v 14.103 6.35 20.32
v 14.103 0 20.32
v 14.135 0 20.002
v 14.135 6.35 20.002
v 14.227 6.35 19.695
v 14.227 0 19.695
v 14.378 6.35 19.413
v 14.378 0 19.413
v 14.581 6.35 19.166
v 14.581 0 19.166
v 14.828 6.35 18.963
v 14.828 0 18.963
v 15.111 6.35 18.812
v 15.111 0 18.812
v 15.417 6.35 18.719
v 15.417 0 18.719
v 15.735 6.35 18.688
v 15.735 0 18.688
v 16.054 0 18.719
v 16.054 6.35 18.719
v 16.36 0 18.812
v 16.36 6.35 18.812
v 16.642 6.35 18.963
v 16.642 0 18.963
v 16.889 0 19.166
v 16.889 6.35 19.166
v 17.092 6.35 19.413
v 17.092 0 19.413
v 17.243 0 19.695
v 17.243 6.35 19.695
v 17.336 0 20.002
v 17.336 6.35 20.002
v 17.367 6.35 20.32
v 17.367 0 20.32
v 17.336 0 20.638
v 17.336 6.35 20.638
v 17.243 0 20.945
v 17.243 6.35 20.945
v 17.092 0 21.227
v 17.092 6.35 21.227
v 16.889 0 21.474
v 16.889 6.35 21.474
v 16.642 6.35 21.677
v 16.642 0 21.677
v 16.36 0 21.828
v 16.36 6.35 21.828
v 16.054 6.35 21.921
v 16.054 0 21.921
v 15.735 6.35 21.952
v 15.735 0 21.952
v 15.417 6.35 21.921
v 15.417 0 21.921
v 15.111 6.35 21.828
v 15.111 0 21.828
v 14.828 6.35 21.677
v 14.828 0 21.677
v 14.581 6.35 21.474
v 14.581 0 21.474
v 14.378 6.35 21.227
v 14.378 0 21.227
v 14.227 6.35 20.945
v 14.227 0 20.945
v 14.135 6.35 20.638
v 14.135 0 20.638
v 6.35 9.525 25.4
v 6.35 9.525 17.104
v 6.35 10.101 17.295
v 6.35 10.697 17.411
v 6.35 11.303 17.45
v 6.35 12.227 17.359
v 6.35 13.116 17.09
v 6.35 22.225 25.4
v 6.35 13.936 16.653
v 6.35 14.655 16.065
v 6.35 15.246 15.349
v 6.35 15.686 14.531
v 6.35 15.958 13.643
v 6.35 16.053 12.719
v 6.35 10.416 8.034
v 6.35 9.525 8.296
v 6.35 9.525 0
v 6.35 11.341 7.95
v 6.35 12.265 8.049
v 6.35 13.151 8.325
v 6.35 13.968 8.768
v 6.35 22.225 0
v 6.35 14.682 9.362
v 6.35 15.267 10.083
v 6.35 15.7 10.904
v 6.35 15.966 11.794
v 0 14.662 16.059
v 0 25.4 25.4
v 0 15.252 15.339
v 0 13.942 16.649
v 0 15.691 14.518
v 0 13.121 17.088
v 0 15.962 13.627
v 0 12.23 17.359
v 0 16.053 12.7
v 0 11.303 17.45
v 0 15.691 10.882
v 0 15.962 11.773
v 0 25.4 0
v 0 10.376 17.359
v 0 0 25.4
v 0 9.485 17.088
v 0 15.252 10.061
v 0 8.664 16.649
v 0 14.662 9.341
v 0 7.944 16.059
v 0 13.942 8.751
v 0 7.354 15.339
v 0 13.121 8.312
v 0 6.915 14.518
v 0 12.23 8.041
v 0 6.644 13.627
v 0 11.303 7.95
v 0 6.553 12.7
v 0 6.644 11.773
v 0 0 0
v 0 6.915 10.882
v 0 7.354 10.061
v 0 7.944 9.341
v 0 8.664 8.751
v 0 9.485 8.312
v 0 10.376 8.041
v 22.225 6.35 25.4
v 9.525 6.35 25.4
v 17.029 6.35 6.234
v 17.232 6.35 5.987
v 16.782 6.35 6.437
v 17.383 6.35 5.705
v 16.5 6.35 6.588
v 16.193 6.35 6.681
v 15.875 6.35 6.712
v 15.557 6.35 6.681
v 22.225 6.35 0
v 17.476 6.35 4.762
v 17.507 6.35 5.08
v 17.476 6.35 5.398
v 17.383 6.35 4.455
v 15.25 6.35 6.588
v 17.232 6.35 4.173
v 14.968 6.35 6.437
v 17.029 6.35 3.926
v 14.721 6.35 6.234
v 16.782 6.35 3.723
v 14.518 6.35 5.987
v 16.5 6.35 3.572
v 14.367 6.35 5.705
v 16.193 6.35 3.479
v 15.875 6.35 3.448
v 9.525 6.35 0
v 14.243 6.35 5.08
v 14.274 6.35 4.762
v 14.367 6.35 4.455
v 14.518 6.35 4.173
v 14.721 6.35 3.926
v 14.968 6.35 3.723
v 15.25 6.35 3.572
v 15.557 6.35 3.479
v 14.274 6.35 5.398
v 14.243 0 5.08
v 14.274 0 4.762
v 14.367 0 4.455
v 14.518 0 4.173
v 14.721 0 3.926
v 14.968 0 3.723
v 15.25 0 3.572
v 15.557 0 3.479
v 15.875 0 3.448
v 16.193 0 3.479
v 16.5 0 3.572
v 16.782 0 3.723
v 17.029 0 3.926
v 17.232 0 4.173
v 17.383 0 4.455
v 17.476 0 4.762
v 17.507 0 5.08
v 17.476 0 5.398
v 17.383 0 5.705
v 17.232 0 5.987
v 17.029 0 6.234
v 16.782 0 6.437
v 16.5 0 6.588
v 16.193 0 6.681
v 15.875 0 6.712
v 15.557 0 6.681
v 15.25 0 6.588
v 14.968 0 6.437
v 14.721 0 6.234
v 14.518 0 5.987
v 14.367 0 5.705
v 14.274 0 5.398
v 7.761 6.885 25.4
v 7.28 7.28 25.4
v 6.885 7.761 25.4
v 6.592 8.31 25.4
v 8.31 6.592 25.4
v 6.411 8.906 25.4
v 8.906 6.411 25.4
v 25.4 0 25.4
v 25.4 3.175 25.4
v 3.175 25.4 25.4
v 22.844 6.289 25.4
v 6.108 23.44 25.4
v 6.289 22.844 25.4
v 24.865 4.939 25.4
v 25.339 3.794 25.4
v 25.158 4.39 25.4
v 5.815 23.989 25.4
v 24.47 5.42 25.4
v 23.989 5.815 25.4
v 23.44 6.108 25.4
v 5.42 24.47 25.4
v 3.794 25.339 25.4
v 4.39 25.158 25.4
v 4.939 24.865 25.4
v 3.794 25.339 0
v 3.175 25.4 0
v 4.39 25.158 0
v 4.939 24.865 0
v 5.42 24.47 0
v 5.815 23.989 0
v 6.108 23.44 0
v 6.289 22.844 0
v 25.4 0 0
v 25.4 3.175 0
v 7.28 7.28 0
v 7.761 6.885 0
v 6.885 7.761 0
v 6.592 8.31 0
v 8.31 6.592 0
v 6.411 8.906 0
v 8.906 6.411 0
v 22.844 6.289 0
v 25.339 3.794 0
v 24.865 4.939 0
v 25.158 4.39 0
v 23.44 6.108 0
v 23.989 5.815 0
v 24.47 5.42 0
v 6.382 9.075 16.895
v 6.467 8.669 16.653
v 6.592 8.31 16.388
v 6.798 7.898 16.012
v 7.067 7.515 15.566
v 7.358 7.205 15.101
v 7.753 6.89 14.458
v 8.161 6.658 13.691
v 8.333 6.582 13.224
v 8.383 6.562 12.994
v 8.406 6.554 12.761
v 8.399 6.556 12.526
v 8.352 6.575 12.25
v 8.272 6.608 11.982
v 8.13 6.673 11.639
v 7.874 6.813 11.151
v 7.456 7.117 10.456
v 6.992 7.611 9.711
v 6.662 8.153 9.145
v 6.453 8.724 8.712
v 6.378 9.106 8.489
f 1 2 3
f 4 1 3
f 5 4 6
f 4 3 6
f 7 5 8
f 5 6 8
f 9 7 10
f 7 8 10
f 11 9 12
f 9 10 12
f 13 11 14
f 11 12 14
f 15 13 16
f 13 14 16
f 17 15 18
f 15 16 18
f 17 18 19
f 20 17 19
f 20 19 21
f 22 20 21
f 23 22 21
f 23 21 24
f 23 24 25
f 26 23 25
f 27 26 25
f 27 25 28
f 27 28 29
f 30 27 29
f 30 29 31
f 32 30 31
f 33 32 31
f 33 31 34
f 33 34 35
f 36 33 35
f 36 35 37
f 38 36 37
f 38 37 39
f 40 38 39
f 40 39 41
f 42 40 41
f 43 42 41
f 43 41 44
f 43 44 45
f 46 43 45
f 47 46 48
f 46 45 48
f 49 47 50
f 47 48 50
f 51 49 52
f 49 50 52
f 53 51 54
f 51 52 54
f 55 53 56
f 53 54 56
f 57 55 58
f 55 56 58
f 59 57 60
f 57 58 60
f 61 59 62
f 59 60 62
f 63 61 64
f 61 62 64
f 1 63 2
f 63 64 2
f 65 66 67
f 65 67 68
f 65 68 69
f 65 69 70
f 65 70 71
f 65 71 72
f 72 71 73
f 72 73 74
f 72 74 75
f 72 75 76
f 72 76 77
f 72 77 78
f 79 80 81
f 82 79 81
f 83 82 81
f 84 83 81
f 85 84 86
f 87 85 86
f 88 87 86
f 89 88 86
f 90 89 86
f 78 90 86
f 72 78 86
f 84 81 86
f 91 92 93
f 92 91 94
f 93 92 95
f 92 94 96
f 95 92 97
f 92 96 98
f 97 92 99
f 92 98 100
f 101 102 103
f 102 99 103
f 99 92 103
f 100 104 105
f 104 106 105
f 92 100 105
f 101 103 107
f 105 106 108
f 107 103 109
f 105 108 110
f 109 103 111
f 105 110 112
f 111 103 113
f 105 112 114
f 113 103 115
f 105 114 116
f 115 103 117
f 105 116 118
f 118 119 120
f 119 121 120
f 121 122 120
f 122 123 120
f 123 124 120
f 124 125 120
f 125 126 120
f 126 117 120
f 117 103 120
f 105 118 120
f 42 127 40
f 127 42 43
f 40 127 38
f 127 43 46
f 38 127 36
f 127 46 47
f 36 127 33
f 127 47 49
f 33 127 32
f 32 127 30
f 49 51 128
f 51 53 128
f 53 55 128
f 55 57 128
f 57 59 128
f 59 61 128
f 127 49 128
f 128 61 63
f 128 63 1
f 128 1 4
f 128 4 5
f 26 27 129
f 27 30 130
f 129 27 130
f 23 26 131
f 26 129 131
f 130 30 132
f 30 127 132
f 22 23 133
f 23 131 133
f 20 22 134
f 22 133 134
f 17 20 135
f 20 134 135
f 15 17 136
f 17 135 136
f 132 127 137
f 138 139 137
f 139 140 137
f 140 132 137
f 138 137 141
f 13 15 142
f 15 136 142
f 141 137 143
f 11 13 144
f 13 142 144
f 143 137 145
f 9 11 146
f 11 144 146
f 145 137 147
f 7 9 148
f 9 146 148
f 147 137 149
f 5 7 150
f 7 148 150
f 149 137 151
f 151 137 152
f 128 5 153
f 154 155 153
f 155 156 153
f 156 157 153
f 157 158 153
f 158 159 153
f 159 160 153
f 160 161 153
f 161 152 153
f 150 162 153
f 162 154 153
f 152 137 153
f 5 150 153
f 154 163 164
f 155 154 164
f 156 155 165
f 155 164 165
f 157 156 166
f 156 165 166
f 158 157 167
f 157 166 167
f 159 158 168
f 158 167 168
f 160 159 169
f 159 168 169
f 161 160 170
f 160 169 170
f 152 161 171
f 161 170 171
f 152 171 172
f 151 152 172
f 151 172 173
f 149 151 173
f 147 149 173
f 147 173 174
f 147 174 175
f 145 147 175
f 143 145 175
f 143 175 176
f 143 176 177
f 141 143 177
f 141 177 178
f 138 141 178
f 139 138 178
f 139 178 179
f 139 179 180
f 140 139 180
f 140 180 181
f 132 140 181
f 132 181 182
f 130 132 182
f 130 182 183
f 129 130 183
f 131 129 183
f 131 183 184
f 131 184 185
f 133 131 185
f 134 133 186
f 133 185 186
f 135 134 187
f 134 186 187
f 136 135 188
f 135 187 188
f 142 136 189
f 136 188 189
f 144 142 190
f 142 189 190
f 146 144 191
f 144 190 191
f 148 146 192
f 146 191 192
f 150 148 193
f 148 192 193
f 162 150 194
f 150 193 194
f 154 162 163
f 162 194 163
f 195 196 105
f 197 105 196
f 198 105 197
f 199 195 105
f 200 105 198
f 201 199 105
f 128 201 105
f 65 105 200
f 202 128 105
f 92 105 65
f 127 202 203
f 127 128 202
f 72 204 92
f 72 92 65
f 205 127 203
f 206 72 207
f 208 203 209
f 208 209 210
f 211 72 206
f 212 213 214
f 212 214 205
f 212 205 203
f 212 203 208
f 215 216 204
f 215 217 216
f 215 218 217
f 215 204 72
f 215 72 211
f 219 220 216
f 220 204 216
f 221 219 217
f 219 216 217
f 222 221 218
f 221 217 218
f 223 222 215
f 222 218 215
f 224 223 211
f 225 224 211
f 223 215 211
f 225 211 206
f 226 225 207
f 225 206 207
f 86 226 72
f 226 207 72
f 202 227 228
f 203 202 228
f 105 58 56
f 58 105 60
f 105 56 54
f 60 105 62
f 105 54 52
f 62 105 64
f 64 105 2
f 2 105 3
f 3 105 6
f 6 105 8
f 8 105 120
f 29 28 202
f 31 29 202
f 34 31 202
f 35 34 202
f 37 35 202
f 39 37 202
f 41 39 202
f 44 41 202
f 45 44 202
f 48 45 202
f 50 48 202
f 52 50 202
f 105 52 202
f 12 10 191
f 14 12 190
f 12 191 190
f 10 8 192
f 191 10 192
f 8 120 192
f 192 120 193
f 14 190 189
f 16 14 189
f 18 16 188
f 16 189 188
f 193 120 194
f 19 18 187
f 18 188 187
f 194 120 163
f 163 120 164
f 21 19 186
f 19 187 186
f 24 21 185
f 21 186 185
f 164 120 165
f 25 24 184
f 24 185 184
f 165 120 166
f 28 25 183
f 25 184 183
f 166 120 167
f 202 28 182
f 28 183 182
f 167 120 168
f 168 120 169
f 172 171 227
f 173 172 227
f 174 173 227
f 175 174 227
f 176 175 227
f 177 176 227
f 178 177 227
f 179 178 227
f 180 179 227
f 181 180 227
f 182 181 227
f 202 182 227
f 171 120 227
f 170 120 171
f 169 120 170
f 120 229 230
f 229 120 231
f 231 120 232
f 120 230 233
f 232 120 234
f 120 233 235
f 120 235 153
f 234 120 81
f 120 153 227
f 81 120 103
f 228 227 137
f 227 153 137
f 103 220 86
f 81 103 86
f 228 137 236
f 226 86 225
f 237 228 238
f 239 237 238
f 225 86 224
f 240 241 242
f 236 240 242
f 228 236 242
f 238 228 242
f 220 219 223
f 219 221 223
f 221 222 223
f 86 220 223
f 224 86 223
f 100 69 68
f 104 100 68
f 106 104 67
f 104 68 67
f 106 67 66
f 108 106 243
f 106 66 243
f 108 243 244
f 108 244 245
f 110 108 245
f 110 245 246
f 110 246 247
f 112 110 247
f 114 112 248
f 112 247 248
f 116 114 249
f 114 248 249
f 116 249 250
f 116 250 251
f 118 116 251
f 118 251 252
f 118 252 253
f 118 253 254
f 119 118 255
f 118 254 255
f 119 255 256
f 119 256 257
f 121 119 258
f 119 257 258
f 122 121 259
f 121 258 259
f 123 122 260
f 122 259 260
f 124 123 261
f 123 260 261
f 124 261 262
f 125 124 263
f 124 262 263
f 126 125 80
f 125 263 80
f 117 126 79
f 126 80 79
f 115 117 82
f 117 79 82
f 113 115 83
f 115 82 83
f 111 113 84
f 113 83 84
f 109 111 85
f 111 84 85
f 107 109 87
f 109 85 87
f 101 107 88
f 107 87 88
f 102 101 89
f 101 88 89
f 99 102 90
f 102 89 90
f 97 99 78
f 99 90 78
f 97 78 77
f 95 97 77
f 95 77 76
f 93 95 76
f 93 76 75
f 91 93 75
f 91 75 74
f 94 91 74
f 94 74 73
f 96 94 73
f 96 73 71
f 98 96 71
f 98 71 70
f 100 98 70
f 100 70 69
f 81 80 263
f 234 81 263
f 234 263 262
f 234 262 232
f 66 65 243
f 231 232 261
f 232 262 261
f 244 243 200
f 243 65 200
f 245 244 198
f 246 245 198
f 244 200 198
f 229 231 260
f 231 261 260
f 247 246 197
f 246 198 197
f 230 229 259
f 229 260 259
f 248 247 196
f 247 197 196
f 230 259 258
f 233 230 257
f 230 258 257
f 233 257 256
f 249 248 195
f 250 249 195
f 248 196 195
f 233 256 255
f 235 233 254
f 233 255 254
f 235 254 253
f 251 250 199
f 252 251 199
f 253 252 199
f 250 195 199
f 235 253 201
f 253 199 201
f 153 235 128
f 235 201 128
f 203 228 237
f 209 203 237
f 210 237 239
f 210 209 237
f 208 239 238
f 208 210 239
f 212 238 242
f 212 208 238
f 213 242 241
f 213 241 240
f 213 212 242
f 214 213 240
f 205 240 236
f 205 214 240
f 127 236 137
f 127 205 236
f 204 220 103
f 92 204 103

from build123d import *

# Parameters (mm, degrees)
BOSS_EXTRUDE1_DEPTH          = 25.4
F_4_CLEARANCE_HOLE1_D        = 3.2639
FILLET1_R                    = 3.175
F_3_8_0_374_DIAMETER_HOLE1_D = 9.4996


with BuildPart() as part:
    # Sketch1 → Boss-Extrude1 (new body)
    with BuildSketch(Plane.XY):
        Polygon((0, 25.4), (0, 0), (25.4, 0), (25.4, 6.35), (6.35, 6.35), (6.35, 25.4), align=None)
    extrude(amount=BOSS_EXTRUDE1_DEPTH)

    # #4 Clearance Hole1 (through all)
    with Locations(Plane(origin=(0, 6.35, 0), x_dir=(1, 0, 0), z_dir=(0, 1, 0))):
        with Locations((15.735159407, -20.32), (15.875, -5.08)):
            Hole(F_4_CLEARANCE_HOLE1_D / 2)

    # Fillet1
    fillet1_edges = [part.edges().sort_by_distance(p)[0] for p in [
        (6.35, 6.35, 12.7),
        (25.4, 6.35, 12.7),
        (6.35, 25.4, 12.7),
    ]]
    fillet(fillet1_edges, radius=FILLET1_R)

    # 3/8 (0.374) Diameter Hole1 (through all)
    with Locations(Plane(origin=(0, 0, 0), x_dir=(0, 0, -1), z_dir=(-1, 0, 0))):
        with Locations((-12.7, -11.303)):
            Hole(F_3_8_0_374_DIAMETER_HOLE1_D / 2)


solid = part.part
